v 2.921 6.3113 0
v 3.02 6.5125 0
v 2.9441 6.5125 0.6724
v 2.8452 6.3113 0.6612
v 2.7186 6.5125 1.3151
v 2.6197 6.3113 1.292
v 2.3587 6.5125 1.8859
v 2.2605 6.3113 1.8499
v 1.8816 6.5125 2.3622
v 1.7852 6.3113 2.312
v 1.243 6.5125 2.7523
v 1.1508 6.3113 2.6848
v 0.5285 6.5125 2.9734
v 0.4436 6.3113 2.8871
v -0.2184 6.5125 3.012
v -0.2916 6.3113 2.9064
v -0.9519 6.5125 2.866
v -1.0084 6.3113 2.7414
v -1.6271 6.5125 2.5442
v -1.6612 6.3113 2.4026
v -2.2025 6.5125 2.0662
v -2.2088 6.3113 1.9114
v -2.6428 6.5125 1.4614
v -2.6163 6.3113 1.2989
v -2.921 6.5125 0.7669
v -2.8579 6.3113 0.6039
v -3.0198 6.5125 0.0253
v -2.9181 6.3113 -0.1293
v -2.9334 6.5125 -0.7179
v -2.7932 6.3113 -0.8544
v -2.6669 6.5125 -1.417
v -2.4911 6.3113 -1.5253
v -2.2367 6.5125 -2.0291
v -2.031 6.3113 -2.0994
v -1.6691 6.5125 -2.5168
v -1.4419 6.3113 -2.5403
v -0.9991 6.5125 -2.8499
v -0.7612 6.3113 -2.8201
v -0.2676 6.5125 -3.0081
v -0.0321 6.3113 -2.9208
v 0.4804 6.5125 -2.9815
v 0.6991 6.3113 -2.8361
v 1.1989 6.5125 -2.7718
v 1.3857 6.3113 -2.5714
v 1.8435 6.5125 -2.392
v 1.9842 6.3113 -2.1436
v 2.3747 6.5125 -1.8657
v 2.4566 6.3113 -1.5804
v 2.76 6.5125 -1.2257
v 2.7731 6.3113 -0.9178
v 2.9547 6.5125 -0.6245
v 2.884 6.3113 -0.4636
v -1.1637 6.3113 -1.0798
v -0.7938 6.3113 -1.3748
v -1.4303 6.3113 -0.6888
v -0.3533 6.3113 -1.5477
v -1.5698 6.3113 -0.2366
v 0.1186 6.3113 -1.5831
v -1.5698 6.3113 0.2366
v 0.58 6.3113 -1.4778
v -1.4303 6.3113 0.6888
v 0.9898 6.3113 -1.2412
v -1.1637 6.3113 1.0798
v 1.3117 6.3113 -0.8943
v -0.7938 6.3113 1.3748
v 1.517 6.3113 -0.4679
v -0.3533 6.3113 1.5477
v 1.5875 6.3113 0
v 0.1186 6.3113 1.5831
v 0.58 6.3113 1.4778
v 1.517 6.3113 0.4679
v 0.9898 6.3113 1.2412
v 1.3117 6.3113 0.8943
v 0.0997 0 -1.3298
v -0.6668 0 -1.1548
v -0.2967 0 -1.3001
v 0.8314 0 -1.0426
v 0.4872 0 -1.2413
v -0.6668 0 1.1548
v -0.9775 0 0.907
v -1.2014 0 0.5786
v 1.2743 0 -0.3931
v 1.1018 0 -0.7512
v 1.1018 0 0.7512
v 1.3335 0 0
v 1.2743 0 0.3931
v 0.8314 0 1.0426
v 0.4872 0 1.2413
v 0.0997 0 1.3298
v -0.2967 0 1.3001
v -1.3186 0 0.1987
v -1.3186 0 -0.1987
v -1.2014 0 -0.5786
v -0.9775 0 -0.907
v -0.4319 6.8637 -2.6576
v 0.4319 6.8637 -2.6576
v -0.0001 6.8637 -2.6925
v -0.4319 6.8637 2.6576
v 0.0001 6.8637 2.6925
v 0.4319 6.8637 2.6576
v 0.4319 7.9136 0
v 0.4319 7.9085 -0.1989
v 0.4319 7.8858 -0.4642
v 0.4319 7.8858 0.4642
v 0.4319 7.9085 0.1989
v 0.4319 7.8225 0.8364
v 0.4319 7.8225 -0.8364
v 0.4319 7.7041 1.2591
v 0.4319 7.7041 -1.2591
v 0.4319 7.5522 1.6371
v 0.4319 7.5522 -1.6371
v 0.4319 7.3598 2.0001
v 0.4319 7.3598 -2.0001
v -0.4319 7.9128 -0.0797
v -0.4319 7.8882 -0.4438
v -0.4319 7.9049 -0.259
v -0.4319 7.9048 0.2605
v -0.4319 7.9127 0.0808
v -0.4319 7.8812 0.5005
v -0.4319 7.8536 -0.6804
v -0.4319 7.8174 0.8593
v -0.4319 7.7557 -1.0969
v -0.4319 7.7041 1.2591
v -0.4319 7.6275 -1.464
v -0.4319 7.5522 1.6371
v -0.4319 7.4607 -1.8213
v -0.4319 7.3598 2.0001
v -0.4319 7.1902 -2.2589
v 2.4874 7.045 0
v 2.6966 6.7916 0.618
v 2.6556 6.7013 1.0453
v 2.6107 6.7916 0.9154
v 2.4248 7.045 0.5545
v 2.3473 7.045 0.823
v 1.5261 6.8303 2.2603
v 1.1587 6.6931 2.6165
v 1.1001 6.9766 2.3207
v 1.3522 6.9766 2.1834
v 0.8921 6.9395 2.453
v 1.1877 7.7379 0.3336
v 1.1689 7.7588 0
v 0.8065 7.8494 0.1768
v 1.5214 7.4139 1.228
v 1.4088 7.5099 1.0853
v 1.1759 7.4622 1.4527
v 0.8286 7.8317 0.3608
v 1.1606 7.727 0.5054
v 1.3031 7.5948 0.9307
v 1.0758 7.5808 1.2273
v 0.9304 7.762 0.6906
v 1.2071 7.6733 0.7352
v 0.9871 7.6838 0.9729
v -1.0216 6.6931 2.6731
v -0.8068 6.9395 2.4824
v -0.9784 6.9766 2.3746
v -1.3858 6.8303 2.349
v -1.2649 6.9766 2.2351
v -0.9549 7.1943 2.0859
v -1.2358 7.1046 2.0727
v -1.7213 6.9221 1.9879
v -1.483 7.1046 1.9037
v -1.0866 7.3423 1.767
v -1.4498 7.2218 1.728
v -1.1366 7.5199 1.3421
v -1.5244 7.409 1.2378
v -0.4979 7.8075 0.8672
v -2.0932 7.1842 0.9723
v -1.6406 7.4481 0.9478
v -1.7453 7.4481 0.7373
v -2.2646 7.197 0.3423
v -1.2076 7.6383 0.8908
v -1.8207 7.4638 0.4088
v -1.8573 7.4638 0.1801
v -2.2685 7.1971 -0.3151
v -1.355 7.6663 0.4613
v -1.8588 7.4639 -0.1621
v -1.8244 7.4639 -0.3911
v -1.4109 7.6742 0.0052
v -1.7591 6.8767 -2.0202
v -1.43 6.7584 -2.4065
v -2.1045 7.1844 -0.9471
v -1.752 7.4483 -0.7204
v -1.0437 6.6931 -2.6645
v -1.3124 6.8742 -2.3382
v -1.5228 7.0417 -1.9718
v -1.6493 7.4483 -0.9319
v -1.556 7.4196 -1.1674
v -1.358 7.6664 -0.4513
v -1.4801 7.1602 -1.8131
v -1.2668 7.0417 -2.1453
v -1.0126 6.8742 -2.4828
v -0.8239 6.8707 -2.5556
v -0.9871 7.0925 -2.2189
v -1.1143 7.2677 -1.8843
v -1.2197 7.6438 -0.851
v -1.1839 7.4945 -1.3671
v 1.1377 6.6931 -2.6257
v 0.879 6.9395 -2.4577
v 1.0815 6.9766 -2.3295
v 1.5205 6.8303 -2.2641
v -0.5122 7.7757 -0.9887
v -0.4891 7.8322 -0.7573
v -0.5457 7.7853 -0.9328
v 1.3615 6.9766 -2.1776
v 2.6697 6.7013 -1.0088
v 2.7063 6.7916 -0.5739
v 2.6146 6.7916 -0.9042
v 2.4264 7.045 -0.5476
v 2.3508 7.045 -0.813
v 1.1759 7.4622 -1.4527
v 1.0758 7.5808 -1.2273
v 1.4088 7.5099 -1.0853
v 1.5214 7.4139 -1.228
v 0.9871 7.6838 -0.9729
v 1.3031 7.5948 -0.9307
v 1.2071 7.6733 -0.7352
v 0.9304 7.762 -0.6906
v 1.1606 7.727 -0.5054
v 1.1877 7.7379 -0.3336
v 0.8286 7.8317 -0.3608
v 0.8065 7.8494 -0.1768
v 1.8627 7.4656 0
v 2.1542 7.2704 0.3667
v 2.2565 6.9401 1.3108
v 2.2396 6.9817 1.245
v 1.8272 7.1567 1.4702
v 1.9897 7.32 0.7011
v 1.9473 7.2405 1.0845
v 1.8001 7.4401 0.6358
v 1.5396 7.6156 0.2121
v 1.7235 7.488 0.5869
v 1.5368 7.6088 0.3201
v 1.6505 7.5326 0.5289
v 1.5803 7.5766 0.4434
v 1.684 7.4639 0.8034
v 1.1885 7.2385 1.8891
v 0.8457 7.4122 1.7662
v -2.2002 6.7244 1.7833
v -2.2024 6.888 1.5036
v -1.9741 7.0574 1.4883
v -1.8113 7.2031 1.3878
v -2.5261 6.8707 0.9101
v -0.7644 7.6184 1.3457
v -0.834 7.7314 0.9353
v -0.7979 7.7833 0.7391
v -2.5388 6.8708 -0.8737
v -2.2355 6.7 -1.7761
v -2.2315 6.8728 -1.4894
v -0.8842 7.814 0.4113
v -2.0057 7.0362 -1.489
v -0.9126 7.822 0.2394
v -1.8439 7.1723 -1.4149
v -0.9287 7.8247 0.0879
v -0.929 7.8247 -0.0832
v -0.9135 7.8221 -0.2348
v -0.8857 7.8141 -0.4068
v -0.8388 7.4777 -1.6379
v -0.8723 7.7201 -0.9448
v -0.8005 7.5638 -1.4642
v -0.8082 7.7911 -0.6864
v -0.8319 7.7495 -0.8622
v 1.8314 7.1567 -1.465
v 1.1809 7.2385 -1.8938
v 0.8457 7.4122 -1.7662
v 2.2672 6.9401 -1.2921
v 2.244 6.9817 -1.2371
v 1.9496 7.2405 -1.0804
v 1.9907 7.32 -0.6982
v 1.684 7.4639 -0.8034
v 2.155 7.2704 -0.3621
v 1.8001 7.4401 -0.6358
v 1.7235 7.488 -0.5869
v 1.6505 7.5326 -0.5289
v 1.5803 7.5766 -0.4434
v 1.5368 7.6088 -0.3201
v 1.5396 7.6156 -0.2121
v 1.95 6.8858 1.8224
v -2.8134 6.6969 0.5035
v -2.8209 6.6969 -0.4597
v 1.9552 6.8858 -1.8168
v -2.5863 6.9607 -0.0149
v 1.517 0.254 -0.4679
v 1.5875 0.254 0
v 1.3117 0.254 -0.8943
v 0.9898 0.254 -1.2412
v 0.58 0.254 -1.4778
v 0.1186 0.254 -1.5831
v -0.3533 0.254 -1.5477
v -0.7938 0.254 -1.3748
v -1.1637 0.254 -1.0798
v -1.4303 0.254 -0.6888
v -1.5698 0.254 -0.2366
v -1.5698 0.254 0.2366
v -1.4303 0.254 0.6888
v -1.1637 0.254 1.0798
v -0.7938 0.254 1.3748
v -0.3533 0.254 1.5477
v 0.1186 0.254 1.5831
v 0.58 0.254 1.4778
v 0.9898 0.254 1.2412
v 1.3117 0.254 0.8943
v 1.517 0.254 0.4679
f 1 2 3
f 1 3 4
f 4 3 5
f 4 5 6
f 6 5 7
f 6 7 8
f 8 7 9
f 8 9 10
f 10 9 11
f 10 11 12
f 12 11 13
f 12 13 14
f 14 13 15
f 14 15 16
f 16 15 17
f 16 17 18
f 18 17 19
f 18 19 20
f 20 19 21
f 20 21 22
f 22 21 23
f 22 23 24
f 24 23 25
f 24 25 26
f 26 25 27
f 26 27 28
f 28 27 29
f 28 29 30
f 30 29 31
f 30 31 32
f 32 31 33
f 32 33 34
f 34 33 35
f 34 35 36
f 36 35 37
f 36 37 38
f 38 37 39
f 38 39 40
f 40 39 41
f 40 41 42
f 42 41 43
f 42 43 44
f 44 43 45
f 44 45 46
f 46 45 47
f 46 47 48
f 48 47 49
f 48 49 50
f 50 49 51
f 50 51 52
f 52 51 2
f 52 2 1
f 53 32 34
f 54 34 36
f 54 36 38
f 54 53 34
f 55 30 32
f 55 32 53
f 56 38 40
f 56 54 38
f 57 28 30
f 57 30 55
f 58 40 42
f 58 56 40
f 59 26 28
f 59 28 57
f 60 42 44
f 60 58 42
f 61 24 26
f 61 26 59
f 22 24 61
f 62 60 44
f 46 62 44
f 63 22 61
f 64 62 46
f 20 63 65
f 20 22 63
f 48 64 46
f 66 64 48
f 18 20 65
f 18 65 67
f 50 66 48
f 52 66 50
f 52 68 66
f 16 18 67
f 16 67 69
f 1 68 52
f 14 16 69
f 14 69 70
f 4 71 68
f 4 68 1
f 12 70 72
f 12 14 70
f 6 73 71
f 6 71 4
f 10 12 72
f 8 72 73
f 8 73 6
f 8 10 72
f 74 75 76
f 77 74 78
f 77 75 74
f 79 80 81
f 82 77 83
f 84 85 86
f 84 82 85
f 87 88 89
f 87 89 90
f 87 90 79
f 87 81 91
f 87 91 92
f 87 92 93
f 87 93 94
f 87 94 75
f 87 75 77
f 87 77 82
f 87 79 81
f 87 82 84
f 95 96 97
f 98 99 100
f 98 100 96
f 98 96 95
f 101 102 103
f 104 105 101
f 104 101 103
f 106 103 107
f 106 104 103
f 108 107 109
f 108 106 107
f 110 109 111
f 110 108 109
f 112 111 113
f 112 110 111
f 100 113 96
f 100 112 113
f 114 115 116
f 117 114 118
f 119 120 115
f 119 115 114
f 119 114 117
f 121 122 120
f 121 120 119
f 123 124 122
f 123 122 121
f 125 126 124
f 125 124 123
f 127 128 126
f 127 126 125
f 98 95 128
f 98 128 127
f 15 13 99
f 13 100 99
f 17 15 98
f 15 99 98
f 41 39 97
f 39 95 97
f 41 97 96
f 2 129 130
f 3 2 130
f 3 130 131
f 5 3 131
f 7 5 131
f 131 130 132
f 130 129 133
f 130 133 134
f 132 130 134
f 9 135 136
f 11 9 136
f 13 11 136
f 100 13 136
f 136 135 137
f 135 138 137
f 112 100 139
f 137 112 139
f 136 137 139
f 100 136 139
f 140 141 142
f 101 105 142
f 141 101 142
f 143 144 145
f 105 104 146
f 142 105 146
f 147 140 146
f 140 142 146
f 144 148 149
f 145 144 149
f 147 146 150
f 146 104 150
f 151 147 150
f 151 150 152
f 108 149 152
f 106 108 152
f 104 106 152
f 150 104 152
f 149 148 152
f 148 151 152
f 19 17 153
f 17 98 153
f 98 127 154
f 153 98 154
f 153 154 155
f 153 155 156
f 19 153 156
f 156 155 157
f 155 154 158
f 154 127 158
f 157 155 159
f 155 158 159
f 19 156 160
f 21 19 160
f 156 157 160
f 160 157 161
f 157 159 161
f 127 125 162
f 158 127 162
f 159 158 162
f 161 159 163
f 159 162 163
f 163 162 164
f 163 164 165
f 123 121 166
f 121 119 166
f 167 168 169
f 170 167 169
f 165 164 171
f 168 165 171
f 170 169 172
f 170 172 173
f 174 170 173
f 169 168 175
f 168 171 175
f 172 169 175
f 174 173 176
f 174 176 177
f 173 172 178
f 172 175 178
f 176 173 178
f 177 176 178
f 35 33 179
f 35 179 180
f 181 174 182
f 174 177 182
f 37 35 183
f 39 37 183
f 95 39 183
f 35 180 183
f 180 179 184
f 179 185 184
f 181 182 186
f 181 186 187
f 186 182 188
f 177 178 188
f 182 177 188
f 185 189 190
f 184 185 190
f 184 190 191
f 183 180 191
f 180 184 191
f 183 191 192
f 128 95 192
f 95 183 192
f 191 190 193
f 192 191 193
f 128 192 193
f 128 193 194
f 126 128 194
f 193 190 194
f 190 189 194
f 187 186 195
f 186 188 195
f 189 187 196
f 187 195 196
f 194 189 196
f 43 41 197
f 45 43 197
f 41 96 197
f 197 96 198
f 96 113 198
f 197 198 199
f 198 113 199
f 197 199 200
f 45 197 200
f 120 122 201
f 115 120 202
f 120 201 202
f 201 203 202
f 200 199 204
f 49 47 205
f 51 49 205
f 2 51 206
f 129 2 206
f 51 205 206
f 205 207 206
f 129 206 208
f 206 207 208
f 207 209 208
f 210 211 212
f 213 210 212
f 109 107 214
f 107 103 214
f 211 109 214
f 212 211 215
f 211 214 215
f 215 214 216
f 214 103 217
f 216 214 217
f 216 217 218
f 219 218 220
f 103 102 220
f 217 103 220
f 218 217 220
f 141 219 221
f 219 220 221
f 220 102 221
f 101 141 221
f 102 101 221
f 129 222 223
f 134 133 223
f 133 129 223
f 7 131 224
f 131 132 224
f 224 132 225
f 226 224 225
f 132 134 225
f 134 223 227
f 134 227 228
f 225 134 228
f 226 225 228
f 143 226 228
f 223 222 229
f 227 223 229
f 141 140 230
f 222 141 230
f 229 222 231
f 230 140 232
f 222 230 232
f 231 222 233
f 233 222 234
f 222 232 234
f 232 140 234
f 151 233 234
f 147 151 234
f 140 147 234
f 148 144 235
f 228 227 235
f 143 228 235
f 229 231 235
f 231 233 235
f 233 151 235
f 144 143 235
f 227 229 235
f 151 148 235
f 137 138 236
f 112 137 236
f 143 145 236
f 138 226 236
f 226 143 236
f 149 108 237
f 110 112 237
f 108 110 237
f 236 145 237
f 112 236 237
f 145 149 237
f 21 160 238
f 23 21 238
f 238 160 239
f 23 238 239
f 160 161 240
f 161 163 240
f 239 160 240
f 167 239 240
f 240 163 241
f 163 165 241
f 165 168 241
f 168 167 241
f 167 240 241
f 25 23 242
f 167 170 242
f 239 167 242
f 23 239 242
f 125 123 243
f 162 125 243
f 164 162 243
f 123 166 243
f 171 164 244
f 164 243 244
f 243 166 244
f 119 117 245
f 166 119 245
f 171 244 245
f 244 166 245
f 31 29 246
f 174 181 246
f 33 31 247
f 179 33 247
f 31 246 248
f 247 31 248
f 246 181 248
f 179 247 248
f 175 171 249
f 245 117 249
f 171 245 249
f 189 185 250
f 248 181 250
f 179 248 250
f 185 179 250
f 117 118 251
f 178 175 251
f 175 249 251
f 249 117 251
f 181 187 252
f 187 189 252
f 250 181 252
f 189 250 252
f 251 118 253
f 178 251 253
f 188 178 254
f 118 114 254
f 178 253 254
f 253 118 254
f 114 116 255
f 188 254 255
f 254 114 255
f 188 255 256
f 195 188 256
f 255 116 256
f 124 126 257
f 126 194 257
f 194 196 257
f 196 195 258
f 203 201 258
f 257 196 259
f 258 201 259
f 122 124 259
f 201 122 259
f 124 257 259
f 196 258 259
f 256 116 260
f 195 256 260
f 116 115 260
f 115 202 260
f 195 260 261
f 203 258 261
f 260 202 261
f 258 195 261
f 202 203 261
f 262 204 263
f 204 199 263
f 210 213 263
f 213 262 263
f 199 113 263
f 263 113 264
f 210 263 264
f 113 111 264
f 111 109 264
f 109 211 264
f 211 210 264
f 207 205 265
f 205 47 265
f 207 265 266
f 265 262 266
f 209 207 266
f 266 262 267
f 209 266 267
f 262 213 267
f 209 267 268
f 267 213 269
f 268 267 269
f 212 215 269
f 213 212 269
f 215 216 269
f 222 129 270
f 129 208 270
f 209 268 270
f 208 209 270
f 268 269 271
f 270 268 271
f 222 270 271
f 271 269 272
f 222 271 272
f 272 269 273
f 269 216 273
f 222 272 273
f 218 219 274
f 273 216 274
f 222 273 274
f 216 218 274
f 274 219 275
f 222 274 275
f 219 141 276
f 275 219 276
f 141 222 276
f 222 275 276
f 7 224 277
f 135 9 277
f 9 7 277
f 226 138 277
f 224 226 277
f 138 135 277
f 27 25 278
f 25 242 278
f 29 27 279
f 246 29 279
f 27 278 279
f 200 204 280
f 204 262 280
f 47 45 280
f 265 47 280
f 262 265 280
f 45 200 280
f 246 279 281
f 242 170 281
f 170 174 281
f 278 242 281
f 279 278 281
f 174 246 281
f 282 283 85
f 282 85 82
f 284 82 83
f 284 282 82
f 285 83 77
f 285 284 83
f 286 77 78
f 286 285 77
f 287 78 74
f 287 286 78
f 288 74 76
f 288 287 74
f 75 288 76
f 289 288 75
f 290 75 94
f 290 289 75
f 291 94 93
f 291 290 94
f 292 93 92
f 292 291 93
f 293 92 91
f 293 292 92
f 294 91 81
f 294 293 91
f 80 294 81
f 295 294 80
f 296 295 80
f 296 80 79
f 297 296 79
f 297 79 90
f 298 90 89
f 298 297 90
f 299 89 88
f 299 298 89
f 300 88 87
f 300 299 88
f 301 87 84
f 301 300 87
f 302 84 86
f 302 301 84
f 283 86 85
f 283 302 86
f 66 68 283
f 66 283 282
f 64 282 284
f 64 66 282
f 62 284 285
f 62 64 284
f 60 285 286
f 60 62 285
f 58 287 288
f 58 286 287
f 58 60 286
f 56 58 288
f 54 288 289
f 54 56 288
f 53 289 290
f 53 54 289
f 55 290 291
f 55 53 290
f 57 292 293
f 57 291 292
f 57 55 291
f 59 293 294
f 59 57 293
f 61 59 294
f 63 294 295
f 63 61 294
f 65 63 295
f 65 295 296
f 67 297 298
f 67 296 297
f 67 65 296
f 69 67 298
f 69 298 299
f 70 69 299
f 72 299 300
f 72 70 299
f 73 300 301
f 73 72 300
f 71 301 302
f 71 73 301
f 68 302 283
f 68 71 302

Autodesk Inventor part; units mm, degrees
ref_plane "YZ Plane" through (0, 0, 0) normal (1, 0, 0) x (0, 1, 0)
ref_plane "XZ Plane" through (0, 0, 0) normal (0, 1, 0) x (-1, 0, 0)
ref_plane "XY Plane" through (0, 0, 0) normal (0, 0, 1) x (1, 0, 0)
sketch "Sketch1" plane through (0, 0, 0) normal (0, 0, 1) x (1, 0, 0)
  line L0 (0, 7.9375) -> (0, 0)
  line L1 (0, 0) -> (1.5875, 0)
  line L2 (1.5875, 0) -> (1.5875, 6.3113)
  line L3 (1.5875, 6.3113) -> (3.175, 6.3113)
  arc A0 (3.175, 6.3113) -> (0, 7.9375) centre (0, 4.0249) ccw
  line L4 (-3.8487, 7.9375) -> (5.6755, 7.9375)
  dimension "d0" = 1.5875
  dimension "d1" = 1.5875
  dimension "d2" = 7.9375
  dimension "d10" = 3.9126
revolve "Revolution1" add sketch "Sketch1" angle 360 about axis through (0, 7.9375, 0) along (0, -1, 0)
chamfer "Chamfer1" distance 0.254 angle 45 2 edges at (-1.5875, 0, 0) (-3.175, 6.3113, 0)
sketch "Sketch2" plane through (0, 0, 0) normal (0, 0, 1) x (1, 0, 0)
  line L0 (-0.4319, 9.1026) -> (0.4319, 9.1026)
  line L1 (0.4319, 9.1026) -> (0.4319, 6.8637)
  line L2 (0.4319, 6.8637) -> (-0.4319, 6.8637)
  line L3 (-0.4319, 6.8637) -> (-0.4319, 9.1026)
  line L4 (-1.5875, 6.3113) -> (-1.5875, 0.254) projected
  line L5 (1.5875, 6.3113) -> (1.5875, 0.254) projected
  dimension "d6" = 1.1556
  dimension "d7" = 1.1556
extrude "Extrusion1" cut sketch "Sketch2" against normal mid plane 25.4
equation "\"d7\" = d6"
properties part number "screw"
